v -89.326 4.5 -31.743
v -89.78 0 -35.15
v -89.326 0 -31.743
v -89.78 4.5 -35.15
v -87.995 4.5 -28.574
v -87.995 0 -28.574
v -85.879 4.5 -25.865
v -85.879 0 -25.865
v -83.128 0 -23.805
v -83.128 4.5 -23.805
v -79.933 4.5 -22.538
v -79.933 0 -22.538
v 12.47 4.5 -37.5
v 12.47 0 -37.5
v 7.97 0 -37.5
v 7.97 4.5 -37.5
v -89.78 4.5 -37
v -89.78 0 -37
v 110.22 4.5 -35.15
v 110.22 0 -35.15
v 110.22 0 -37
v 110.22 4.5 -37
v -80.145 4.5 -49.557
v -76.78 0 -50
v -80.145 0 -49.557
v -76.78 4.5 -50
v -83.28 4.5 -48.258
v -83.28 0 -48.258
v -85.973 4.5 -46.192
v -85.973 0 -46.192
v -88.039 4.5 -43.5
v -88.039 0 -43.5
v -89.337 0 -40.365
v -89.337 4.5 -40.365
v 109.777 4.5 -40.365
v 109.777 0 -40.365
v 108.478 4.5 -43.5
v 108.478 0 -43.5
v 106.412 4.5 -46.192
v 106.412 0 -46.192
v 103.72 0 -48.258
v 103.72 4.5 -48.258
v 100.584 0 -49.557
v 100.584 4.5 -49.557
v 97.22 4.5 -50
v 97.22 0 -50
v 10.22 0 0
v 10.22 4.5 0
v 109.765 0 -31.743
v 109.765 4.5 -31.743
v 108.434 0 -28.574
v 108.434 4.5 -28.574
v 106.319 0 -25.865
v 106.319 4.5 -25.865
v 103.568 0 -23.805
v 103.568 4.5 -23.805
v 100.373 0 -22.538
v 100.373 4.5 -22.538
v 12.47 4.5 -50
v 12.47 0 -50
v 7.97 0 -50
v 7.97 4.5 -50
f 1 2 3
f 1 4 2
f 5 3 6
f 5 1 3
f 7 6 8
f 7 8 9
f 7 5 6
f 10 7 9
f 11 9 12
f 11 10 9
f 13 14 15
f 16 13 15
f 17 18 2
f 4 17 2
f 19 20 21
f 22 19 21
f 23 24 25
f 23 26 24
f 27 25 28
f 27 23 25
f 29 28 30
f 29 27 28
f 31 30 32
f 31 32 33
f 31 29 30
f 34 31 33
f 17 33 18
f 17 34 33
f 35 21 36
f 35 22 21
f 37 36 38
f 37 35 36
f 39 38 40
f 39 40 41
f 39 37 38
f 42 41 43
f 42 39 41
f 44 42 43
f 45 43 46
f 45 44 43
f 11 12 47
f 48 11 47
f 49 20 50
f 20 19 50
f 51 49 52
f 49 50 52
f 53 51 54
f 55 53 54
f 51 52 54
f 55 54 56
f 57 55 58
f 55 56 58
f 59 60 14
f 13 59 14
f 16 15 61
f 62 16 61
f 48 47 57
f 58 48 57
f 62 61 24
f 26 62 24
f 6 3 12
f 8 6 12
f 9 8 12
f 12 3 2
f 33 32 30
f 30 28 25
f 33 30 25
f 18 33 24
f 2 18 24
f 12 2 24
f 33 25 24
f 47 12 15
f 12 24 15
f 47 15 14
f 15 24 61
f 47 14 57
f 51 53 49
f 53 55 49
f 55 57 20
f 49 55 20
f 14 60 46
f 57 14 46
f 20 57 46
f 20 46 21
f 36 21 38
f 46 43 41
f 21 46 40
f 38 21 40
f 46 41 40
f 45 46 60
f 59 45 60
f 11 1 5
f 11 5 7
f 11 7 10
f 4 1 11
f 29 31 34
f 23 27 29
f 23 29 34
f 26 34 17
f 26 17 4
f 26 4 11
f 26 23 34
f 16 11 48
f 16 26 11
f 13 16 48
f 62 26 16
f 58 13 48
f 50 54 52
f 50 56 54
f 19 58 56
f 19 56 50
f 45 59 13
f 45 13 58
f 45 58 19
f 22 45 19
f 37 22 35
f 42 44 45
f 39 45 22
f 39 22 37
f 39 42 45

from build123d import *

# Parameters (mm, degrees)
BOSS_EXTRUDE1_DEPTH = 4.5
FILLET1_R           = 13


with BuildPart() as part:
    # Sketch1 → Boss-Extrude1 (new body)
    with BuildSketch(Plane(origin=(0, 0, 0), x_dir=(1, 0, 0), z_dir=(0, 1, 0))):
        Polygon((110.219806784, 25), (110.219806784, 50), (12.469806784, 50), (12.469806784, 37.5), (7.969806784, 37.5), (7.969806784, 50), (-89.780193216, 50), (-89.780193216, 25), (10.219806784, 0), align=None)
    extrude(amount=BOSS_EXTRUDE1_DEPTH)

    # Fillet1
    fillet1_edges = [part.edges().sort_by_distance(p)[0] for p in [
        (110.219806784, 2.25, -50),
        (110.219806784, 2.25, -25),
        (-89.780193216, 2.25, -25),
        (-89.780193216, 2.25, -50),
    ]]
    fillet(fillet1_edges, radius=FILLET1_R)


solid = part.part
